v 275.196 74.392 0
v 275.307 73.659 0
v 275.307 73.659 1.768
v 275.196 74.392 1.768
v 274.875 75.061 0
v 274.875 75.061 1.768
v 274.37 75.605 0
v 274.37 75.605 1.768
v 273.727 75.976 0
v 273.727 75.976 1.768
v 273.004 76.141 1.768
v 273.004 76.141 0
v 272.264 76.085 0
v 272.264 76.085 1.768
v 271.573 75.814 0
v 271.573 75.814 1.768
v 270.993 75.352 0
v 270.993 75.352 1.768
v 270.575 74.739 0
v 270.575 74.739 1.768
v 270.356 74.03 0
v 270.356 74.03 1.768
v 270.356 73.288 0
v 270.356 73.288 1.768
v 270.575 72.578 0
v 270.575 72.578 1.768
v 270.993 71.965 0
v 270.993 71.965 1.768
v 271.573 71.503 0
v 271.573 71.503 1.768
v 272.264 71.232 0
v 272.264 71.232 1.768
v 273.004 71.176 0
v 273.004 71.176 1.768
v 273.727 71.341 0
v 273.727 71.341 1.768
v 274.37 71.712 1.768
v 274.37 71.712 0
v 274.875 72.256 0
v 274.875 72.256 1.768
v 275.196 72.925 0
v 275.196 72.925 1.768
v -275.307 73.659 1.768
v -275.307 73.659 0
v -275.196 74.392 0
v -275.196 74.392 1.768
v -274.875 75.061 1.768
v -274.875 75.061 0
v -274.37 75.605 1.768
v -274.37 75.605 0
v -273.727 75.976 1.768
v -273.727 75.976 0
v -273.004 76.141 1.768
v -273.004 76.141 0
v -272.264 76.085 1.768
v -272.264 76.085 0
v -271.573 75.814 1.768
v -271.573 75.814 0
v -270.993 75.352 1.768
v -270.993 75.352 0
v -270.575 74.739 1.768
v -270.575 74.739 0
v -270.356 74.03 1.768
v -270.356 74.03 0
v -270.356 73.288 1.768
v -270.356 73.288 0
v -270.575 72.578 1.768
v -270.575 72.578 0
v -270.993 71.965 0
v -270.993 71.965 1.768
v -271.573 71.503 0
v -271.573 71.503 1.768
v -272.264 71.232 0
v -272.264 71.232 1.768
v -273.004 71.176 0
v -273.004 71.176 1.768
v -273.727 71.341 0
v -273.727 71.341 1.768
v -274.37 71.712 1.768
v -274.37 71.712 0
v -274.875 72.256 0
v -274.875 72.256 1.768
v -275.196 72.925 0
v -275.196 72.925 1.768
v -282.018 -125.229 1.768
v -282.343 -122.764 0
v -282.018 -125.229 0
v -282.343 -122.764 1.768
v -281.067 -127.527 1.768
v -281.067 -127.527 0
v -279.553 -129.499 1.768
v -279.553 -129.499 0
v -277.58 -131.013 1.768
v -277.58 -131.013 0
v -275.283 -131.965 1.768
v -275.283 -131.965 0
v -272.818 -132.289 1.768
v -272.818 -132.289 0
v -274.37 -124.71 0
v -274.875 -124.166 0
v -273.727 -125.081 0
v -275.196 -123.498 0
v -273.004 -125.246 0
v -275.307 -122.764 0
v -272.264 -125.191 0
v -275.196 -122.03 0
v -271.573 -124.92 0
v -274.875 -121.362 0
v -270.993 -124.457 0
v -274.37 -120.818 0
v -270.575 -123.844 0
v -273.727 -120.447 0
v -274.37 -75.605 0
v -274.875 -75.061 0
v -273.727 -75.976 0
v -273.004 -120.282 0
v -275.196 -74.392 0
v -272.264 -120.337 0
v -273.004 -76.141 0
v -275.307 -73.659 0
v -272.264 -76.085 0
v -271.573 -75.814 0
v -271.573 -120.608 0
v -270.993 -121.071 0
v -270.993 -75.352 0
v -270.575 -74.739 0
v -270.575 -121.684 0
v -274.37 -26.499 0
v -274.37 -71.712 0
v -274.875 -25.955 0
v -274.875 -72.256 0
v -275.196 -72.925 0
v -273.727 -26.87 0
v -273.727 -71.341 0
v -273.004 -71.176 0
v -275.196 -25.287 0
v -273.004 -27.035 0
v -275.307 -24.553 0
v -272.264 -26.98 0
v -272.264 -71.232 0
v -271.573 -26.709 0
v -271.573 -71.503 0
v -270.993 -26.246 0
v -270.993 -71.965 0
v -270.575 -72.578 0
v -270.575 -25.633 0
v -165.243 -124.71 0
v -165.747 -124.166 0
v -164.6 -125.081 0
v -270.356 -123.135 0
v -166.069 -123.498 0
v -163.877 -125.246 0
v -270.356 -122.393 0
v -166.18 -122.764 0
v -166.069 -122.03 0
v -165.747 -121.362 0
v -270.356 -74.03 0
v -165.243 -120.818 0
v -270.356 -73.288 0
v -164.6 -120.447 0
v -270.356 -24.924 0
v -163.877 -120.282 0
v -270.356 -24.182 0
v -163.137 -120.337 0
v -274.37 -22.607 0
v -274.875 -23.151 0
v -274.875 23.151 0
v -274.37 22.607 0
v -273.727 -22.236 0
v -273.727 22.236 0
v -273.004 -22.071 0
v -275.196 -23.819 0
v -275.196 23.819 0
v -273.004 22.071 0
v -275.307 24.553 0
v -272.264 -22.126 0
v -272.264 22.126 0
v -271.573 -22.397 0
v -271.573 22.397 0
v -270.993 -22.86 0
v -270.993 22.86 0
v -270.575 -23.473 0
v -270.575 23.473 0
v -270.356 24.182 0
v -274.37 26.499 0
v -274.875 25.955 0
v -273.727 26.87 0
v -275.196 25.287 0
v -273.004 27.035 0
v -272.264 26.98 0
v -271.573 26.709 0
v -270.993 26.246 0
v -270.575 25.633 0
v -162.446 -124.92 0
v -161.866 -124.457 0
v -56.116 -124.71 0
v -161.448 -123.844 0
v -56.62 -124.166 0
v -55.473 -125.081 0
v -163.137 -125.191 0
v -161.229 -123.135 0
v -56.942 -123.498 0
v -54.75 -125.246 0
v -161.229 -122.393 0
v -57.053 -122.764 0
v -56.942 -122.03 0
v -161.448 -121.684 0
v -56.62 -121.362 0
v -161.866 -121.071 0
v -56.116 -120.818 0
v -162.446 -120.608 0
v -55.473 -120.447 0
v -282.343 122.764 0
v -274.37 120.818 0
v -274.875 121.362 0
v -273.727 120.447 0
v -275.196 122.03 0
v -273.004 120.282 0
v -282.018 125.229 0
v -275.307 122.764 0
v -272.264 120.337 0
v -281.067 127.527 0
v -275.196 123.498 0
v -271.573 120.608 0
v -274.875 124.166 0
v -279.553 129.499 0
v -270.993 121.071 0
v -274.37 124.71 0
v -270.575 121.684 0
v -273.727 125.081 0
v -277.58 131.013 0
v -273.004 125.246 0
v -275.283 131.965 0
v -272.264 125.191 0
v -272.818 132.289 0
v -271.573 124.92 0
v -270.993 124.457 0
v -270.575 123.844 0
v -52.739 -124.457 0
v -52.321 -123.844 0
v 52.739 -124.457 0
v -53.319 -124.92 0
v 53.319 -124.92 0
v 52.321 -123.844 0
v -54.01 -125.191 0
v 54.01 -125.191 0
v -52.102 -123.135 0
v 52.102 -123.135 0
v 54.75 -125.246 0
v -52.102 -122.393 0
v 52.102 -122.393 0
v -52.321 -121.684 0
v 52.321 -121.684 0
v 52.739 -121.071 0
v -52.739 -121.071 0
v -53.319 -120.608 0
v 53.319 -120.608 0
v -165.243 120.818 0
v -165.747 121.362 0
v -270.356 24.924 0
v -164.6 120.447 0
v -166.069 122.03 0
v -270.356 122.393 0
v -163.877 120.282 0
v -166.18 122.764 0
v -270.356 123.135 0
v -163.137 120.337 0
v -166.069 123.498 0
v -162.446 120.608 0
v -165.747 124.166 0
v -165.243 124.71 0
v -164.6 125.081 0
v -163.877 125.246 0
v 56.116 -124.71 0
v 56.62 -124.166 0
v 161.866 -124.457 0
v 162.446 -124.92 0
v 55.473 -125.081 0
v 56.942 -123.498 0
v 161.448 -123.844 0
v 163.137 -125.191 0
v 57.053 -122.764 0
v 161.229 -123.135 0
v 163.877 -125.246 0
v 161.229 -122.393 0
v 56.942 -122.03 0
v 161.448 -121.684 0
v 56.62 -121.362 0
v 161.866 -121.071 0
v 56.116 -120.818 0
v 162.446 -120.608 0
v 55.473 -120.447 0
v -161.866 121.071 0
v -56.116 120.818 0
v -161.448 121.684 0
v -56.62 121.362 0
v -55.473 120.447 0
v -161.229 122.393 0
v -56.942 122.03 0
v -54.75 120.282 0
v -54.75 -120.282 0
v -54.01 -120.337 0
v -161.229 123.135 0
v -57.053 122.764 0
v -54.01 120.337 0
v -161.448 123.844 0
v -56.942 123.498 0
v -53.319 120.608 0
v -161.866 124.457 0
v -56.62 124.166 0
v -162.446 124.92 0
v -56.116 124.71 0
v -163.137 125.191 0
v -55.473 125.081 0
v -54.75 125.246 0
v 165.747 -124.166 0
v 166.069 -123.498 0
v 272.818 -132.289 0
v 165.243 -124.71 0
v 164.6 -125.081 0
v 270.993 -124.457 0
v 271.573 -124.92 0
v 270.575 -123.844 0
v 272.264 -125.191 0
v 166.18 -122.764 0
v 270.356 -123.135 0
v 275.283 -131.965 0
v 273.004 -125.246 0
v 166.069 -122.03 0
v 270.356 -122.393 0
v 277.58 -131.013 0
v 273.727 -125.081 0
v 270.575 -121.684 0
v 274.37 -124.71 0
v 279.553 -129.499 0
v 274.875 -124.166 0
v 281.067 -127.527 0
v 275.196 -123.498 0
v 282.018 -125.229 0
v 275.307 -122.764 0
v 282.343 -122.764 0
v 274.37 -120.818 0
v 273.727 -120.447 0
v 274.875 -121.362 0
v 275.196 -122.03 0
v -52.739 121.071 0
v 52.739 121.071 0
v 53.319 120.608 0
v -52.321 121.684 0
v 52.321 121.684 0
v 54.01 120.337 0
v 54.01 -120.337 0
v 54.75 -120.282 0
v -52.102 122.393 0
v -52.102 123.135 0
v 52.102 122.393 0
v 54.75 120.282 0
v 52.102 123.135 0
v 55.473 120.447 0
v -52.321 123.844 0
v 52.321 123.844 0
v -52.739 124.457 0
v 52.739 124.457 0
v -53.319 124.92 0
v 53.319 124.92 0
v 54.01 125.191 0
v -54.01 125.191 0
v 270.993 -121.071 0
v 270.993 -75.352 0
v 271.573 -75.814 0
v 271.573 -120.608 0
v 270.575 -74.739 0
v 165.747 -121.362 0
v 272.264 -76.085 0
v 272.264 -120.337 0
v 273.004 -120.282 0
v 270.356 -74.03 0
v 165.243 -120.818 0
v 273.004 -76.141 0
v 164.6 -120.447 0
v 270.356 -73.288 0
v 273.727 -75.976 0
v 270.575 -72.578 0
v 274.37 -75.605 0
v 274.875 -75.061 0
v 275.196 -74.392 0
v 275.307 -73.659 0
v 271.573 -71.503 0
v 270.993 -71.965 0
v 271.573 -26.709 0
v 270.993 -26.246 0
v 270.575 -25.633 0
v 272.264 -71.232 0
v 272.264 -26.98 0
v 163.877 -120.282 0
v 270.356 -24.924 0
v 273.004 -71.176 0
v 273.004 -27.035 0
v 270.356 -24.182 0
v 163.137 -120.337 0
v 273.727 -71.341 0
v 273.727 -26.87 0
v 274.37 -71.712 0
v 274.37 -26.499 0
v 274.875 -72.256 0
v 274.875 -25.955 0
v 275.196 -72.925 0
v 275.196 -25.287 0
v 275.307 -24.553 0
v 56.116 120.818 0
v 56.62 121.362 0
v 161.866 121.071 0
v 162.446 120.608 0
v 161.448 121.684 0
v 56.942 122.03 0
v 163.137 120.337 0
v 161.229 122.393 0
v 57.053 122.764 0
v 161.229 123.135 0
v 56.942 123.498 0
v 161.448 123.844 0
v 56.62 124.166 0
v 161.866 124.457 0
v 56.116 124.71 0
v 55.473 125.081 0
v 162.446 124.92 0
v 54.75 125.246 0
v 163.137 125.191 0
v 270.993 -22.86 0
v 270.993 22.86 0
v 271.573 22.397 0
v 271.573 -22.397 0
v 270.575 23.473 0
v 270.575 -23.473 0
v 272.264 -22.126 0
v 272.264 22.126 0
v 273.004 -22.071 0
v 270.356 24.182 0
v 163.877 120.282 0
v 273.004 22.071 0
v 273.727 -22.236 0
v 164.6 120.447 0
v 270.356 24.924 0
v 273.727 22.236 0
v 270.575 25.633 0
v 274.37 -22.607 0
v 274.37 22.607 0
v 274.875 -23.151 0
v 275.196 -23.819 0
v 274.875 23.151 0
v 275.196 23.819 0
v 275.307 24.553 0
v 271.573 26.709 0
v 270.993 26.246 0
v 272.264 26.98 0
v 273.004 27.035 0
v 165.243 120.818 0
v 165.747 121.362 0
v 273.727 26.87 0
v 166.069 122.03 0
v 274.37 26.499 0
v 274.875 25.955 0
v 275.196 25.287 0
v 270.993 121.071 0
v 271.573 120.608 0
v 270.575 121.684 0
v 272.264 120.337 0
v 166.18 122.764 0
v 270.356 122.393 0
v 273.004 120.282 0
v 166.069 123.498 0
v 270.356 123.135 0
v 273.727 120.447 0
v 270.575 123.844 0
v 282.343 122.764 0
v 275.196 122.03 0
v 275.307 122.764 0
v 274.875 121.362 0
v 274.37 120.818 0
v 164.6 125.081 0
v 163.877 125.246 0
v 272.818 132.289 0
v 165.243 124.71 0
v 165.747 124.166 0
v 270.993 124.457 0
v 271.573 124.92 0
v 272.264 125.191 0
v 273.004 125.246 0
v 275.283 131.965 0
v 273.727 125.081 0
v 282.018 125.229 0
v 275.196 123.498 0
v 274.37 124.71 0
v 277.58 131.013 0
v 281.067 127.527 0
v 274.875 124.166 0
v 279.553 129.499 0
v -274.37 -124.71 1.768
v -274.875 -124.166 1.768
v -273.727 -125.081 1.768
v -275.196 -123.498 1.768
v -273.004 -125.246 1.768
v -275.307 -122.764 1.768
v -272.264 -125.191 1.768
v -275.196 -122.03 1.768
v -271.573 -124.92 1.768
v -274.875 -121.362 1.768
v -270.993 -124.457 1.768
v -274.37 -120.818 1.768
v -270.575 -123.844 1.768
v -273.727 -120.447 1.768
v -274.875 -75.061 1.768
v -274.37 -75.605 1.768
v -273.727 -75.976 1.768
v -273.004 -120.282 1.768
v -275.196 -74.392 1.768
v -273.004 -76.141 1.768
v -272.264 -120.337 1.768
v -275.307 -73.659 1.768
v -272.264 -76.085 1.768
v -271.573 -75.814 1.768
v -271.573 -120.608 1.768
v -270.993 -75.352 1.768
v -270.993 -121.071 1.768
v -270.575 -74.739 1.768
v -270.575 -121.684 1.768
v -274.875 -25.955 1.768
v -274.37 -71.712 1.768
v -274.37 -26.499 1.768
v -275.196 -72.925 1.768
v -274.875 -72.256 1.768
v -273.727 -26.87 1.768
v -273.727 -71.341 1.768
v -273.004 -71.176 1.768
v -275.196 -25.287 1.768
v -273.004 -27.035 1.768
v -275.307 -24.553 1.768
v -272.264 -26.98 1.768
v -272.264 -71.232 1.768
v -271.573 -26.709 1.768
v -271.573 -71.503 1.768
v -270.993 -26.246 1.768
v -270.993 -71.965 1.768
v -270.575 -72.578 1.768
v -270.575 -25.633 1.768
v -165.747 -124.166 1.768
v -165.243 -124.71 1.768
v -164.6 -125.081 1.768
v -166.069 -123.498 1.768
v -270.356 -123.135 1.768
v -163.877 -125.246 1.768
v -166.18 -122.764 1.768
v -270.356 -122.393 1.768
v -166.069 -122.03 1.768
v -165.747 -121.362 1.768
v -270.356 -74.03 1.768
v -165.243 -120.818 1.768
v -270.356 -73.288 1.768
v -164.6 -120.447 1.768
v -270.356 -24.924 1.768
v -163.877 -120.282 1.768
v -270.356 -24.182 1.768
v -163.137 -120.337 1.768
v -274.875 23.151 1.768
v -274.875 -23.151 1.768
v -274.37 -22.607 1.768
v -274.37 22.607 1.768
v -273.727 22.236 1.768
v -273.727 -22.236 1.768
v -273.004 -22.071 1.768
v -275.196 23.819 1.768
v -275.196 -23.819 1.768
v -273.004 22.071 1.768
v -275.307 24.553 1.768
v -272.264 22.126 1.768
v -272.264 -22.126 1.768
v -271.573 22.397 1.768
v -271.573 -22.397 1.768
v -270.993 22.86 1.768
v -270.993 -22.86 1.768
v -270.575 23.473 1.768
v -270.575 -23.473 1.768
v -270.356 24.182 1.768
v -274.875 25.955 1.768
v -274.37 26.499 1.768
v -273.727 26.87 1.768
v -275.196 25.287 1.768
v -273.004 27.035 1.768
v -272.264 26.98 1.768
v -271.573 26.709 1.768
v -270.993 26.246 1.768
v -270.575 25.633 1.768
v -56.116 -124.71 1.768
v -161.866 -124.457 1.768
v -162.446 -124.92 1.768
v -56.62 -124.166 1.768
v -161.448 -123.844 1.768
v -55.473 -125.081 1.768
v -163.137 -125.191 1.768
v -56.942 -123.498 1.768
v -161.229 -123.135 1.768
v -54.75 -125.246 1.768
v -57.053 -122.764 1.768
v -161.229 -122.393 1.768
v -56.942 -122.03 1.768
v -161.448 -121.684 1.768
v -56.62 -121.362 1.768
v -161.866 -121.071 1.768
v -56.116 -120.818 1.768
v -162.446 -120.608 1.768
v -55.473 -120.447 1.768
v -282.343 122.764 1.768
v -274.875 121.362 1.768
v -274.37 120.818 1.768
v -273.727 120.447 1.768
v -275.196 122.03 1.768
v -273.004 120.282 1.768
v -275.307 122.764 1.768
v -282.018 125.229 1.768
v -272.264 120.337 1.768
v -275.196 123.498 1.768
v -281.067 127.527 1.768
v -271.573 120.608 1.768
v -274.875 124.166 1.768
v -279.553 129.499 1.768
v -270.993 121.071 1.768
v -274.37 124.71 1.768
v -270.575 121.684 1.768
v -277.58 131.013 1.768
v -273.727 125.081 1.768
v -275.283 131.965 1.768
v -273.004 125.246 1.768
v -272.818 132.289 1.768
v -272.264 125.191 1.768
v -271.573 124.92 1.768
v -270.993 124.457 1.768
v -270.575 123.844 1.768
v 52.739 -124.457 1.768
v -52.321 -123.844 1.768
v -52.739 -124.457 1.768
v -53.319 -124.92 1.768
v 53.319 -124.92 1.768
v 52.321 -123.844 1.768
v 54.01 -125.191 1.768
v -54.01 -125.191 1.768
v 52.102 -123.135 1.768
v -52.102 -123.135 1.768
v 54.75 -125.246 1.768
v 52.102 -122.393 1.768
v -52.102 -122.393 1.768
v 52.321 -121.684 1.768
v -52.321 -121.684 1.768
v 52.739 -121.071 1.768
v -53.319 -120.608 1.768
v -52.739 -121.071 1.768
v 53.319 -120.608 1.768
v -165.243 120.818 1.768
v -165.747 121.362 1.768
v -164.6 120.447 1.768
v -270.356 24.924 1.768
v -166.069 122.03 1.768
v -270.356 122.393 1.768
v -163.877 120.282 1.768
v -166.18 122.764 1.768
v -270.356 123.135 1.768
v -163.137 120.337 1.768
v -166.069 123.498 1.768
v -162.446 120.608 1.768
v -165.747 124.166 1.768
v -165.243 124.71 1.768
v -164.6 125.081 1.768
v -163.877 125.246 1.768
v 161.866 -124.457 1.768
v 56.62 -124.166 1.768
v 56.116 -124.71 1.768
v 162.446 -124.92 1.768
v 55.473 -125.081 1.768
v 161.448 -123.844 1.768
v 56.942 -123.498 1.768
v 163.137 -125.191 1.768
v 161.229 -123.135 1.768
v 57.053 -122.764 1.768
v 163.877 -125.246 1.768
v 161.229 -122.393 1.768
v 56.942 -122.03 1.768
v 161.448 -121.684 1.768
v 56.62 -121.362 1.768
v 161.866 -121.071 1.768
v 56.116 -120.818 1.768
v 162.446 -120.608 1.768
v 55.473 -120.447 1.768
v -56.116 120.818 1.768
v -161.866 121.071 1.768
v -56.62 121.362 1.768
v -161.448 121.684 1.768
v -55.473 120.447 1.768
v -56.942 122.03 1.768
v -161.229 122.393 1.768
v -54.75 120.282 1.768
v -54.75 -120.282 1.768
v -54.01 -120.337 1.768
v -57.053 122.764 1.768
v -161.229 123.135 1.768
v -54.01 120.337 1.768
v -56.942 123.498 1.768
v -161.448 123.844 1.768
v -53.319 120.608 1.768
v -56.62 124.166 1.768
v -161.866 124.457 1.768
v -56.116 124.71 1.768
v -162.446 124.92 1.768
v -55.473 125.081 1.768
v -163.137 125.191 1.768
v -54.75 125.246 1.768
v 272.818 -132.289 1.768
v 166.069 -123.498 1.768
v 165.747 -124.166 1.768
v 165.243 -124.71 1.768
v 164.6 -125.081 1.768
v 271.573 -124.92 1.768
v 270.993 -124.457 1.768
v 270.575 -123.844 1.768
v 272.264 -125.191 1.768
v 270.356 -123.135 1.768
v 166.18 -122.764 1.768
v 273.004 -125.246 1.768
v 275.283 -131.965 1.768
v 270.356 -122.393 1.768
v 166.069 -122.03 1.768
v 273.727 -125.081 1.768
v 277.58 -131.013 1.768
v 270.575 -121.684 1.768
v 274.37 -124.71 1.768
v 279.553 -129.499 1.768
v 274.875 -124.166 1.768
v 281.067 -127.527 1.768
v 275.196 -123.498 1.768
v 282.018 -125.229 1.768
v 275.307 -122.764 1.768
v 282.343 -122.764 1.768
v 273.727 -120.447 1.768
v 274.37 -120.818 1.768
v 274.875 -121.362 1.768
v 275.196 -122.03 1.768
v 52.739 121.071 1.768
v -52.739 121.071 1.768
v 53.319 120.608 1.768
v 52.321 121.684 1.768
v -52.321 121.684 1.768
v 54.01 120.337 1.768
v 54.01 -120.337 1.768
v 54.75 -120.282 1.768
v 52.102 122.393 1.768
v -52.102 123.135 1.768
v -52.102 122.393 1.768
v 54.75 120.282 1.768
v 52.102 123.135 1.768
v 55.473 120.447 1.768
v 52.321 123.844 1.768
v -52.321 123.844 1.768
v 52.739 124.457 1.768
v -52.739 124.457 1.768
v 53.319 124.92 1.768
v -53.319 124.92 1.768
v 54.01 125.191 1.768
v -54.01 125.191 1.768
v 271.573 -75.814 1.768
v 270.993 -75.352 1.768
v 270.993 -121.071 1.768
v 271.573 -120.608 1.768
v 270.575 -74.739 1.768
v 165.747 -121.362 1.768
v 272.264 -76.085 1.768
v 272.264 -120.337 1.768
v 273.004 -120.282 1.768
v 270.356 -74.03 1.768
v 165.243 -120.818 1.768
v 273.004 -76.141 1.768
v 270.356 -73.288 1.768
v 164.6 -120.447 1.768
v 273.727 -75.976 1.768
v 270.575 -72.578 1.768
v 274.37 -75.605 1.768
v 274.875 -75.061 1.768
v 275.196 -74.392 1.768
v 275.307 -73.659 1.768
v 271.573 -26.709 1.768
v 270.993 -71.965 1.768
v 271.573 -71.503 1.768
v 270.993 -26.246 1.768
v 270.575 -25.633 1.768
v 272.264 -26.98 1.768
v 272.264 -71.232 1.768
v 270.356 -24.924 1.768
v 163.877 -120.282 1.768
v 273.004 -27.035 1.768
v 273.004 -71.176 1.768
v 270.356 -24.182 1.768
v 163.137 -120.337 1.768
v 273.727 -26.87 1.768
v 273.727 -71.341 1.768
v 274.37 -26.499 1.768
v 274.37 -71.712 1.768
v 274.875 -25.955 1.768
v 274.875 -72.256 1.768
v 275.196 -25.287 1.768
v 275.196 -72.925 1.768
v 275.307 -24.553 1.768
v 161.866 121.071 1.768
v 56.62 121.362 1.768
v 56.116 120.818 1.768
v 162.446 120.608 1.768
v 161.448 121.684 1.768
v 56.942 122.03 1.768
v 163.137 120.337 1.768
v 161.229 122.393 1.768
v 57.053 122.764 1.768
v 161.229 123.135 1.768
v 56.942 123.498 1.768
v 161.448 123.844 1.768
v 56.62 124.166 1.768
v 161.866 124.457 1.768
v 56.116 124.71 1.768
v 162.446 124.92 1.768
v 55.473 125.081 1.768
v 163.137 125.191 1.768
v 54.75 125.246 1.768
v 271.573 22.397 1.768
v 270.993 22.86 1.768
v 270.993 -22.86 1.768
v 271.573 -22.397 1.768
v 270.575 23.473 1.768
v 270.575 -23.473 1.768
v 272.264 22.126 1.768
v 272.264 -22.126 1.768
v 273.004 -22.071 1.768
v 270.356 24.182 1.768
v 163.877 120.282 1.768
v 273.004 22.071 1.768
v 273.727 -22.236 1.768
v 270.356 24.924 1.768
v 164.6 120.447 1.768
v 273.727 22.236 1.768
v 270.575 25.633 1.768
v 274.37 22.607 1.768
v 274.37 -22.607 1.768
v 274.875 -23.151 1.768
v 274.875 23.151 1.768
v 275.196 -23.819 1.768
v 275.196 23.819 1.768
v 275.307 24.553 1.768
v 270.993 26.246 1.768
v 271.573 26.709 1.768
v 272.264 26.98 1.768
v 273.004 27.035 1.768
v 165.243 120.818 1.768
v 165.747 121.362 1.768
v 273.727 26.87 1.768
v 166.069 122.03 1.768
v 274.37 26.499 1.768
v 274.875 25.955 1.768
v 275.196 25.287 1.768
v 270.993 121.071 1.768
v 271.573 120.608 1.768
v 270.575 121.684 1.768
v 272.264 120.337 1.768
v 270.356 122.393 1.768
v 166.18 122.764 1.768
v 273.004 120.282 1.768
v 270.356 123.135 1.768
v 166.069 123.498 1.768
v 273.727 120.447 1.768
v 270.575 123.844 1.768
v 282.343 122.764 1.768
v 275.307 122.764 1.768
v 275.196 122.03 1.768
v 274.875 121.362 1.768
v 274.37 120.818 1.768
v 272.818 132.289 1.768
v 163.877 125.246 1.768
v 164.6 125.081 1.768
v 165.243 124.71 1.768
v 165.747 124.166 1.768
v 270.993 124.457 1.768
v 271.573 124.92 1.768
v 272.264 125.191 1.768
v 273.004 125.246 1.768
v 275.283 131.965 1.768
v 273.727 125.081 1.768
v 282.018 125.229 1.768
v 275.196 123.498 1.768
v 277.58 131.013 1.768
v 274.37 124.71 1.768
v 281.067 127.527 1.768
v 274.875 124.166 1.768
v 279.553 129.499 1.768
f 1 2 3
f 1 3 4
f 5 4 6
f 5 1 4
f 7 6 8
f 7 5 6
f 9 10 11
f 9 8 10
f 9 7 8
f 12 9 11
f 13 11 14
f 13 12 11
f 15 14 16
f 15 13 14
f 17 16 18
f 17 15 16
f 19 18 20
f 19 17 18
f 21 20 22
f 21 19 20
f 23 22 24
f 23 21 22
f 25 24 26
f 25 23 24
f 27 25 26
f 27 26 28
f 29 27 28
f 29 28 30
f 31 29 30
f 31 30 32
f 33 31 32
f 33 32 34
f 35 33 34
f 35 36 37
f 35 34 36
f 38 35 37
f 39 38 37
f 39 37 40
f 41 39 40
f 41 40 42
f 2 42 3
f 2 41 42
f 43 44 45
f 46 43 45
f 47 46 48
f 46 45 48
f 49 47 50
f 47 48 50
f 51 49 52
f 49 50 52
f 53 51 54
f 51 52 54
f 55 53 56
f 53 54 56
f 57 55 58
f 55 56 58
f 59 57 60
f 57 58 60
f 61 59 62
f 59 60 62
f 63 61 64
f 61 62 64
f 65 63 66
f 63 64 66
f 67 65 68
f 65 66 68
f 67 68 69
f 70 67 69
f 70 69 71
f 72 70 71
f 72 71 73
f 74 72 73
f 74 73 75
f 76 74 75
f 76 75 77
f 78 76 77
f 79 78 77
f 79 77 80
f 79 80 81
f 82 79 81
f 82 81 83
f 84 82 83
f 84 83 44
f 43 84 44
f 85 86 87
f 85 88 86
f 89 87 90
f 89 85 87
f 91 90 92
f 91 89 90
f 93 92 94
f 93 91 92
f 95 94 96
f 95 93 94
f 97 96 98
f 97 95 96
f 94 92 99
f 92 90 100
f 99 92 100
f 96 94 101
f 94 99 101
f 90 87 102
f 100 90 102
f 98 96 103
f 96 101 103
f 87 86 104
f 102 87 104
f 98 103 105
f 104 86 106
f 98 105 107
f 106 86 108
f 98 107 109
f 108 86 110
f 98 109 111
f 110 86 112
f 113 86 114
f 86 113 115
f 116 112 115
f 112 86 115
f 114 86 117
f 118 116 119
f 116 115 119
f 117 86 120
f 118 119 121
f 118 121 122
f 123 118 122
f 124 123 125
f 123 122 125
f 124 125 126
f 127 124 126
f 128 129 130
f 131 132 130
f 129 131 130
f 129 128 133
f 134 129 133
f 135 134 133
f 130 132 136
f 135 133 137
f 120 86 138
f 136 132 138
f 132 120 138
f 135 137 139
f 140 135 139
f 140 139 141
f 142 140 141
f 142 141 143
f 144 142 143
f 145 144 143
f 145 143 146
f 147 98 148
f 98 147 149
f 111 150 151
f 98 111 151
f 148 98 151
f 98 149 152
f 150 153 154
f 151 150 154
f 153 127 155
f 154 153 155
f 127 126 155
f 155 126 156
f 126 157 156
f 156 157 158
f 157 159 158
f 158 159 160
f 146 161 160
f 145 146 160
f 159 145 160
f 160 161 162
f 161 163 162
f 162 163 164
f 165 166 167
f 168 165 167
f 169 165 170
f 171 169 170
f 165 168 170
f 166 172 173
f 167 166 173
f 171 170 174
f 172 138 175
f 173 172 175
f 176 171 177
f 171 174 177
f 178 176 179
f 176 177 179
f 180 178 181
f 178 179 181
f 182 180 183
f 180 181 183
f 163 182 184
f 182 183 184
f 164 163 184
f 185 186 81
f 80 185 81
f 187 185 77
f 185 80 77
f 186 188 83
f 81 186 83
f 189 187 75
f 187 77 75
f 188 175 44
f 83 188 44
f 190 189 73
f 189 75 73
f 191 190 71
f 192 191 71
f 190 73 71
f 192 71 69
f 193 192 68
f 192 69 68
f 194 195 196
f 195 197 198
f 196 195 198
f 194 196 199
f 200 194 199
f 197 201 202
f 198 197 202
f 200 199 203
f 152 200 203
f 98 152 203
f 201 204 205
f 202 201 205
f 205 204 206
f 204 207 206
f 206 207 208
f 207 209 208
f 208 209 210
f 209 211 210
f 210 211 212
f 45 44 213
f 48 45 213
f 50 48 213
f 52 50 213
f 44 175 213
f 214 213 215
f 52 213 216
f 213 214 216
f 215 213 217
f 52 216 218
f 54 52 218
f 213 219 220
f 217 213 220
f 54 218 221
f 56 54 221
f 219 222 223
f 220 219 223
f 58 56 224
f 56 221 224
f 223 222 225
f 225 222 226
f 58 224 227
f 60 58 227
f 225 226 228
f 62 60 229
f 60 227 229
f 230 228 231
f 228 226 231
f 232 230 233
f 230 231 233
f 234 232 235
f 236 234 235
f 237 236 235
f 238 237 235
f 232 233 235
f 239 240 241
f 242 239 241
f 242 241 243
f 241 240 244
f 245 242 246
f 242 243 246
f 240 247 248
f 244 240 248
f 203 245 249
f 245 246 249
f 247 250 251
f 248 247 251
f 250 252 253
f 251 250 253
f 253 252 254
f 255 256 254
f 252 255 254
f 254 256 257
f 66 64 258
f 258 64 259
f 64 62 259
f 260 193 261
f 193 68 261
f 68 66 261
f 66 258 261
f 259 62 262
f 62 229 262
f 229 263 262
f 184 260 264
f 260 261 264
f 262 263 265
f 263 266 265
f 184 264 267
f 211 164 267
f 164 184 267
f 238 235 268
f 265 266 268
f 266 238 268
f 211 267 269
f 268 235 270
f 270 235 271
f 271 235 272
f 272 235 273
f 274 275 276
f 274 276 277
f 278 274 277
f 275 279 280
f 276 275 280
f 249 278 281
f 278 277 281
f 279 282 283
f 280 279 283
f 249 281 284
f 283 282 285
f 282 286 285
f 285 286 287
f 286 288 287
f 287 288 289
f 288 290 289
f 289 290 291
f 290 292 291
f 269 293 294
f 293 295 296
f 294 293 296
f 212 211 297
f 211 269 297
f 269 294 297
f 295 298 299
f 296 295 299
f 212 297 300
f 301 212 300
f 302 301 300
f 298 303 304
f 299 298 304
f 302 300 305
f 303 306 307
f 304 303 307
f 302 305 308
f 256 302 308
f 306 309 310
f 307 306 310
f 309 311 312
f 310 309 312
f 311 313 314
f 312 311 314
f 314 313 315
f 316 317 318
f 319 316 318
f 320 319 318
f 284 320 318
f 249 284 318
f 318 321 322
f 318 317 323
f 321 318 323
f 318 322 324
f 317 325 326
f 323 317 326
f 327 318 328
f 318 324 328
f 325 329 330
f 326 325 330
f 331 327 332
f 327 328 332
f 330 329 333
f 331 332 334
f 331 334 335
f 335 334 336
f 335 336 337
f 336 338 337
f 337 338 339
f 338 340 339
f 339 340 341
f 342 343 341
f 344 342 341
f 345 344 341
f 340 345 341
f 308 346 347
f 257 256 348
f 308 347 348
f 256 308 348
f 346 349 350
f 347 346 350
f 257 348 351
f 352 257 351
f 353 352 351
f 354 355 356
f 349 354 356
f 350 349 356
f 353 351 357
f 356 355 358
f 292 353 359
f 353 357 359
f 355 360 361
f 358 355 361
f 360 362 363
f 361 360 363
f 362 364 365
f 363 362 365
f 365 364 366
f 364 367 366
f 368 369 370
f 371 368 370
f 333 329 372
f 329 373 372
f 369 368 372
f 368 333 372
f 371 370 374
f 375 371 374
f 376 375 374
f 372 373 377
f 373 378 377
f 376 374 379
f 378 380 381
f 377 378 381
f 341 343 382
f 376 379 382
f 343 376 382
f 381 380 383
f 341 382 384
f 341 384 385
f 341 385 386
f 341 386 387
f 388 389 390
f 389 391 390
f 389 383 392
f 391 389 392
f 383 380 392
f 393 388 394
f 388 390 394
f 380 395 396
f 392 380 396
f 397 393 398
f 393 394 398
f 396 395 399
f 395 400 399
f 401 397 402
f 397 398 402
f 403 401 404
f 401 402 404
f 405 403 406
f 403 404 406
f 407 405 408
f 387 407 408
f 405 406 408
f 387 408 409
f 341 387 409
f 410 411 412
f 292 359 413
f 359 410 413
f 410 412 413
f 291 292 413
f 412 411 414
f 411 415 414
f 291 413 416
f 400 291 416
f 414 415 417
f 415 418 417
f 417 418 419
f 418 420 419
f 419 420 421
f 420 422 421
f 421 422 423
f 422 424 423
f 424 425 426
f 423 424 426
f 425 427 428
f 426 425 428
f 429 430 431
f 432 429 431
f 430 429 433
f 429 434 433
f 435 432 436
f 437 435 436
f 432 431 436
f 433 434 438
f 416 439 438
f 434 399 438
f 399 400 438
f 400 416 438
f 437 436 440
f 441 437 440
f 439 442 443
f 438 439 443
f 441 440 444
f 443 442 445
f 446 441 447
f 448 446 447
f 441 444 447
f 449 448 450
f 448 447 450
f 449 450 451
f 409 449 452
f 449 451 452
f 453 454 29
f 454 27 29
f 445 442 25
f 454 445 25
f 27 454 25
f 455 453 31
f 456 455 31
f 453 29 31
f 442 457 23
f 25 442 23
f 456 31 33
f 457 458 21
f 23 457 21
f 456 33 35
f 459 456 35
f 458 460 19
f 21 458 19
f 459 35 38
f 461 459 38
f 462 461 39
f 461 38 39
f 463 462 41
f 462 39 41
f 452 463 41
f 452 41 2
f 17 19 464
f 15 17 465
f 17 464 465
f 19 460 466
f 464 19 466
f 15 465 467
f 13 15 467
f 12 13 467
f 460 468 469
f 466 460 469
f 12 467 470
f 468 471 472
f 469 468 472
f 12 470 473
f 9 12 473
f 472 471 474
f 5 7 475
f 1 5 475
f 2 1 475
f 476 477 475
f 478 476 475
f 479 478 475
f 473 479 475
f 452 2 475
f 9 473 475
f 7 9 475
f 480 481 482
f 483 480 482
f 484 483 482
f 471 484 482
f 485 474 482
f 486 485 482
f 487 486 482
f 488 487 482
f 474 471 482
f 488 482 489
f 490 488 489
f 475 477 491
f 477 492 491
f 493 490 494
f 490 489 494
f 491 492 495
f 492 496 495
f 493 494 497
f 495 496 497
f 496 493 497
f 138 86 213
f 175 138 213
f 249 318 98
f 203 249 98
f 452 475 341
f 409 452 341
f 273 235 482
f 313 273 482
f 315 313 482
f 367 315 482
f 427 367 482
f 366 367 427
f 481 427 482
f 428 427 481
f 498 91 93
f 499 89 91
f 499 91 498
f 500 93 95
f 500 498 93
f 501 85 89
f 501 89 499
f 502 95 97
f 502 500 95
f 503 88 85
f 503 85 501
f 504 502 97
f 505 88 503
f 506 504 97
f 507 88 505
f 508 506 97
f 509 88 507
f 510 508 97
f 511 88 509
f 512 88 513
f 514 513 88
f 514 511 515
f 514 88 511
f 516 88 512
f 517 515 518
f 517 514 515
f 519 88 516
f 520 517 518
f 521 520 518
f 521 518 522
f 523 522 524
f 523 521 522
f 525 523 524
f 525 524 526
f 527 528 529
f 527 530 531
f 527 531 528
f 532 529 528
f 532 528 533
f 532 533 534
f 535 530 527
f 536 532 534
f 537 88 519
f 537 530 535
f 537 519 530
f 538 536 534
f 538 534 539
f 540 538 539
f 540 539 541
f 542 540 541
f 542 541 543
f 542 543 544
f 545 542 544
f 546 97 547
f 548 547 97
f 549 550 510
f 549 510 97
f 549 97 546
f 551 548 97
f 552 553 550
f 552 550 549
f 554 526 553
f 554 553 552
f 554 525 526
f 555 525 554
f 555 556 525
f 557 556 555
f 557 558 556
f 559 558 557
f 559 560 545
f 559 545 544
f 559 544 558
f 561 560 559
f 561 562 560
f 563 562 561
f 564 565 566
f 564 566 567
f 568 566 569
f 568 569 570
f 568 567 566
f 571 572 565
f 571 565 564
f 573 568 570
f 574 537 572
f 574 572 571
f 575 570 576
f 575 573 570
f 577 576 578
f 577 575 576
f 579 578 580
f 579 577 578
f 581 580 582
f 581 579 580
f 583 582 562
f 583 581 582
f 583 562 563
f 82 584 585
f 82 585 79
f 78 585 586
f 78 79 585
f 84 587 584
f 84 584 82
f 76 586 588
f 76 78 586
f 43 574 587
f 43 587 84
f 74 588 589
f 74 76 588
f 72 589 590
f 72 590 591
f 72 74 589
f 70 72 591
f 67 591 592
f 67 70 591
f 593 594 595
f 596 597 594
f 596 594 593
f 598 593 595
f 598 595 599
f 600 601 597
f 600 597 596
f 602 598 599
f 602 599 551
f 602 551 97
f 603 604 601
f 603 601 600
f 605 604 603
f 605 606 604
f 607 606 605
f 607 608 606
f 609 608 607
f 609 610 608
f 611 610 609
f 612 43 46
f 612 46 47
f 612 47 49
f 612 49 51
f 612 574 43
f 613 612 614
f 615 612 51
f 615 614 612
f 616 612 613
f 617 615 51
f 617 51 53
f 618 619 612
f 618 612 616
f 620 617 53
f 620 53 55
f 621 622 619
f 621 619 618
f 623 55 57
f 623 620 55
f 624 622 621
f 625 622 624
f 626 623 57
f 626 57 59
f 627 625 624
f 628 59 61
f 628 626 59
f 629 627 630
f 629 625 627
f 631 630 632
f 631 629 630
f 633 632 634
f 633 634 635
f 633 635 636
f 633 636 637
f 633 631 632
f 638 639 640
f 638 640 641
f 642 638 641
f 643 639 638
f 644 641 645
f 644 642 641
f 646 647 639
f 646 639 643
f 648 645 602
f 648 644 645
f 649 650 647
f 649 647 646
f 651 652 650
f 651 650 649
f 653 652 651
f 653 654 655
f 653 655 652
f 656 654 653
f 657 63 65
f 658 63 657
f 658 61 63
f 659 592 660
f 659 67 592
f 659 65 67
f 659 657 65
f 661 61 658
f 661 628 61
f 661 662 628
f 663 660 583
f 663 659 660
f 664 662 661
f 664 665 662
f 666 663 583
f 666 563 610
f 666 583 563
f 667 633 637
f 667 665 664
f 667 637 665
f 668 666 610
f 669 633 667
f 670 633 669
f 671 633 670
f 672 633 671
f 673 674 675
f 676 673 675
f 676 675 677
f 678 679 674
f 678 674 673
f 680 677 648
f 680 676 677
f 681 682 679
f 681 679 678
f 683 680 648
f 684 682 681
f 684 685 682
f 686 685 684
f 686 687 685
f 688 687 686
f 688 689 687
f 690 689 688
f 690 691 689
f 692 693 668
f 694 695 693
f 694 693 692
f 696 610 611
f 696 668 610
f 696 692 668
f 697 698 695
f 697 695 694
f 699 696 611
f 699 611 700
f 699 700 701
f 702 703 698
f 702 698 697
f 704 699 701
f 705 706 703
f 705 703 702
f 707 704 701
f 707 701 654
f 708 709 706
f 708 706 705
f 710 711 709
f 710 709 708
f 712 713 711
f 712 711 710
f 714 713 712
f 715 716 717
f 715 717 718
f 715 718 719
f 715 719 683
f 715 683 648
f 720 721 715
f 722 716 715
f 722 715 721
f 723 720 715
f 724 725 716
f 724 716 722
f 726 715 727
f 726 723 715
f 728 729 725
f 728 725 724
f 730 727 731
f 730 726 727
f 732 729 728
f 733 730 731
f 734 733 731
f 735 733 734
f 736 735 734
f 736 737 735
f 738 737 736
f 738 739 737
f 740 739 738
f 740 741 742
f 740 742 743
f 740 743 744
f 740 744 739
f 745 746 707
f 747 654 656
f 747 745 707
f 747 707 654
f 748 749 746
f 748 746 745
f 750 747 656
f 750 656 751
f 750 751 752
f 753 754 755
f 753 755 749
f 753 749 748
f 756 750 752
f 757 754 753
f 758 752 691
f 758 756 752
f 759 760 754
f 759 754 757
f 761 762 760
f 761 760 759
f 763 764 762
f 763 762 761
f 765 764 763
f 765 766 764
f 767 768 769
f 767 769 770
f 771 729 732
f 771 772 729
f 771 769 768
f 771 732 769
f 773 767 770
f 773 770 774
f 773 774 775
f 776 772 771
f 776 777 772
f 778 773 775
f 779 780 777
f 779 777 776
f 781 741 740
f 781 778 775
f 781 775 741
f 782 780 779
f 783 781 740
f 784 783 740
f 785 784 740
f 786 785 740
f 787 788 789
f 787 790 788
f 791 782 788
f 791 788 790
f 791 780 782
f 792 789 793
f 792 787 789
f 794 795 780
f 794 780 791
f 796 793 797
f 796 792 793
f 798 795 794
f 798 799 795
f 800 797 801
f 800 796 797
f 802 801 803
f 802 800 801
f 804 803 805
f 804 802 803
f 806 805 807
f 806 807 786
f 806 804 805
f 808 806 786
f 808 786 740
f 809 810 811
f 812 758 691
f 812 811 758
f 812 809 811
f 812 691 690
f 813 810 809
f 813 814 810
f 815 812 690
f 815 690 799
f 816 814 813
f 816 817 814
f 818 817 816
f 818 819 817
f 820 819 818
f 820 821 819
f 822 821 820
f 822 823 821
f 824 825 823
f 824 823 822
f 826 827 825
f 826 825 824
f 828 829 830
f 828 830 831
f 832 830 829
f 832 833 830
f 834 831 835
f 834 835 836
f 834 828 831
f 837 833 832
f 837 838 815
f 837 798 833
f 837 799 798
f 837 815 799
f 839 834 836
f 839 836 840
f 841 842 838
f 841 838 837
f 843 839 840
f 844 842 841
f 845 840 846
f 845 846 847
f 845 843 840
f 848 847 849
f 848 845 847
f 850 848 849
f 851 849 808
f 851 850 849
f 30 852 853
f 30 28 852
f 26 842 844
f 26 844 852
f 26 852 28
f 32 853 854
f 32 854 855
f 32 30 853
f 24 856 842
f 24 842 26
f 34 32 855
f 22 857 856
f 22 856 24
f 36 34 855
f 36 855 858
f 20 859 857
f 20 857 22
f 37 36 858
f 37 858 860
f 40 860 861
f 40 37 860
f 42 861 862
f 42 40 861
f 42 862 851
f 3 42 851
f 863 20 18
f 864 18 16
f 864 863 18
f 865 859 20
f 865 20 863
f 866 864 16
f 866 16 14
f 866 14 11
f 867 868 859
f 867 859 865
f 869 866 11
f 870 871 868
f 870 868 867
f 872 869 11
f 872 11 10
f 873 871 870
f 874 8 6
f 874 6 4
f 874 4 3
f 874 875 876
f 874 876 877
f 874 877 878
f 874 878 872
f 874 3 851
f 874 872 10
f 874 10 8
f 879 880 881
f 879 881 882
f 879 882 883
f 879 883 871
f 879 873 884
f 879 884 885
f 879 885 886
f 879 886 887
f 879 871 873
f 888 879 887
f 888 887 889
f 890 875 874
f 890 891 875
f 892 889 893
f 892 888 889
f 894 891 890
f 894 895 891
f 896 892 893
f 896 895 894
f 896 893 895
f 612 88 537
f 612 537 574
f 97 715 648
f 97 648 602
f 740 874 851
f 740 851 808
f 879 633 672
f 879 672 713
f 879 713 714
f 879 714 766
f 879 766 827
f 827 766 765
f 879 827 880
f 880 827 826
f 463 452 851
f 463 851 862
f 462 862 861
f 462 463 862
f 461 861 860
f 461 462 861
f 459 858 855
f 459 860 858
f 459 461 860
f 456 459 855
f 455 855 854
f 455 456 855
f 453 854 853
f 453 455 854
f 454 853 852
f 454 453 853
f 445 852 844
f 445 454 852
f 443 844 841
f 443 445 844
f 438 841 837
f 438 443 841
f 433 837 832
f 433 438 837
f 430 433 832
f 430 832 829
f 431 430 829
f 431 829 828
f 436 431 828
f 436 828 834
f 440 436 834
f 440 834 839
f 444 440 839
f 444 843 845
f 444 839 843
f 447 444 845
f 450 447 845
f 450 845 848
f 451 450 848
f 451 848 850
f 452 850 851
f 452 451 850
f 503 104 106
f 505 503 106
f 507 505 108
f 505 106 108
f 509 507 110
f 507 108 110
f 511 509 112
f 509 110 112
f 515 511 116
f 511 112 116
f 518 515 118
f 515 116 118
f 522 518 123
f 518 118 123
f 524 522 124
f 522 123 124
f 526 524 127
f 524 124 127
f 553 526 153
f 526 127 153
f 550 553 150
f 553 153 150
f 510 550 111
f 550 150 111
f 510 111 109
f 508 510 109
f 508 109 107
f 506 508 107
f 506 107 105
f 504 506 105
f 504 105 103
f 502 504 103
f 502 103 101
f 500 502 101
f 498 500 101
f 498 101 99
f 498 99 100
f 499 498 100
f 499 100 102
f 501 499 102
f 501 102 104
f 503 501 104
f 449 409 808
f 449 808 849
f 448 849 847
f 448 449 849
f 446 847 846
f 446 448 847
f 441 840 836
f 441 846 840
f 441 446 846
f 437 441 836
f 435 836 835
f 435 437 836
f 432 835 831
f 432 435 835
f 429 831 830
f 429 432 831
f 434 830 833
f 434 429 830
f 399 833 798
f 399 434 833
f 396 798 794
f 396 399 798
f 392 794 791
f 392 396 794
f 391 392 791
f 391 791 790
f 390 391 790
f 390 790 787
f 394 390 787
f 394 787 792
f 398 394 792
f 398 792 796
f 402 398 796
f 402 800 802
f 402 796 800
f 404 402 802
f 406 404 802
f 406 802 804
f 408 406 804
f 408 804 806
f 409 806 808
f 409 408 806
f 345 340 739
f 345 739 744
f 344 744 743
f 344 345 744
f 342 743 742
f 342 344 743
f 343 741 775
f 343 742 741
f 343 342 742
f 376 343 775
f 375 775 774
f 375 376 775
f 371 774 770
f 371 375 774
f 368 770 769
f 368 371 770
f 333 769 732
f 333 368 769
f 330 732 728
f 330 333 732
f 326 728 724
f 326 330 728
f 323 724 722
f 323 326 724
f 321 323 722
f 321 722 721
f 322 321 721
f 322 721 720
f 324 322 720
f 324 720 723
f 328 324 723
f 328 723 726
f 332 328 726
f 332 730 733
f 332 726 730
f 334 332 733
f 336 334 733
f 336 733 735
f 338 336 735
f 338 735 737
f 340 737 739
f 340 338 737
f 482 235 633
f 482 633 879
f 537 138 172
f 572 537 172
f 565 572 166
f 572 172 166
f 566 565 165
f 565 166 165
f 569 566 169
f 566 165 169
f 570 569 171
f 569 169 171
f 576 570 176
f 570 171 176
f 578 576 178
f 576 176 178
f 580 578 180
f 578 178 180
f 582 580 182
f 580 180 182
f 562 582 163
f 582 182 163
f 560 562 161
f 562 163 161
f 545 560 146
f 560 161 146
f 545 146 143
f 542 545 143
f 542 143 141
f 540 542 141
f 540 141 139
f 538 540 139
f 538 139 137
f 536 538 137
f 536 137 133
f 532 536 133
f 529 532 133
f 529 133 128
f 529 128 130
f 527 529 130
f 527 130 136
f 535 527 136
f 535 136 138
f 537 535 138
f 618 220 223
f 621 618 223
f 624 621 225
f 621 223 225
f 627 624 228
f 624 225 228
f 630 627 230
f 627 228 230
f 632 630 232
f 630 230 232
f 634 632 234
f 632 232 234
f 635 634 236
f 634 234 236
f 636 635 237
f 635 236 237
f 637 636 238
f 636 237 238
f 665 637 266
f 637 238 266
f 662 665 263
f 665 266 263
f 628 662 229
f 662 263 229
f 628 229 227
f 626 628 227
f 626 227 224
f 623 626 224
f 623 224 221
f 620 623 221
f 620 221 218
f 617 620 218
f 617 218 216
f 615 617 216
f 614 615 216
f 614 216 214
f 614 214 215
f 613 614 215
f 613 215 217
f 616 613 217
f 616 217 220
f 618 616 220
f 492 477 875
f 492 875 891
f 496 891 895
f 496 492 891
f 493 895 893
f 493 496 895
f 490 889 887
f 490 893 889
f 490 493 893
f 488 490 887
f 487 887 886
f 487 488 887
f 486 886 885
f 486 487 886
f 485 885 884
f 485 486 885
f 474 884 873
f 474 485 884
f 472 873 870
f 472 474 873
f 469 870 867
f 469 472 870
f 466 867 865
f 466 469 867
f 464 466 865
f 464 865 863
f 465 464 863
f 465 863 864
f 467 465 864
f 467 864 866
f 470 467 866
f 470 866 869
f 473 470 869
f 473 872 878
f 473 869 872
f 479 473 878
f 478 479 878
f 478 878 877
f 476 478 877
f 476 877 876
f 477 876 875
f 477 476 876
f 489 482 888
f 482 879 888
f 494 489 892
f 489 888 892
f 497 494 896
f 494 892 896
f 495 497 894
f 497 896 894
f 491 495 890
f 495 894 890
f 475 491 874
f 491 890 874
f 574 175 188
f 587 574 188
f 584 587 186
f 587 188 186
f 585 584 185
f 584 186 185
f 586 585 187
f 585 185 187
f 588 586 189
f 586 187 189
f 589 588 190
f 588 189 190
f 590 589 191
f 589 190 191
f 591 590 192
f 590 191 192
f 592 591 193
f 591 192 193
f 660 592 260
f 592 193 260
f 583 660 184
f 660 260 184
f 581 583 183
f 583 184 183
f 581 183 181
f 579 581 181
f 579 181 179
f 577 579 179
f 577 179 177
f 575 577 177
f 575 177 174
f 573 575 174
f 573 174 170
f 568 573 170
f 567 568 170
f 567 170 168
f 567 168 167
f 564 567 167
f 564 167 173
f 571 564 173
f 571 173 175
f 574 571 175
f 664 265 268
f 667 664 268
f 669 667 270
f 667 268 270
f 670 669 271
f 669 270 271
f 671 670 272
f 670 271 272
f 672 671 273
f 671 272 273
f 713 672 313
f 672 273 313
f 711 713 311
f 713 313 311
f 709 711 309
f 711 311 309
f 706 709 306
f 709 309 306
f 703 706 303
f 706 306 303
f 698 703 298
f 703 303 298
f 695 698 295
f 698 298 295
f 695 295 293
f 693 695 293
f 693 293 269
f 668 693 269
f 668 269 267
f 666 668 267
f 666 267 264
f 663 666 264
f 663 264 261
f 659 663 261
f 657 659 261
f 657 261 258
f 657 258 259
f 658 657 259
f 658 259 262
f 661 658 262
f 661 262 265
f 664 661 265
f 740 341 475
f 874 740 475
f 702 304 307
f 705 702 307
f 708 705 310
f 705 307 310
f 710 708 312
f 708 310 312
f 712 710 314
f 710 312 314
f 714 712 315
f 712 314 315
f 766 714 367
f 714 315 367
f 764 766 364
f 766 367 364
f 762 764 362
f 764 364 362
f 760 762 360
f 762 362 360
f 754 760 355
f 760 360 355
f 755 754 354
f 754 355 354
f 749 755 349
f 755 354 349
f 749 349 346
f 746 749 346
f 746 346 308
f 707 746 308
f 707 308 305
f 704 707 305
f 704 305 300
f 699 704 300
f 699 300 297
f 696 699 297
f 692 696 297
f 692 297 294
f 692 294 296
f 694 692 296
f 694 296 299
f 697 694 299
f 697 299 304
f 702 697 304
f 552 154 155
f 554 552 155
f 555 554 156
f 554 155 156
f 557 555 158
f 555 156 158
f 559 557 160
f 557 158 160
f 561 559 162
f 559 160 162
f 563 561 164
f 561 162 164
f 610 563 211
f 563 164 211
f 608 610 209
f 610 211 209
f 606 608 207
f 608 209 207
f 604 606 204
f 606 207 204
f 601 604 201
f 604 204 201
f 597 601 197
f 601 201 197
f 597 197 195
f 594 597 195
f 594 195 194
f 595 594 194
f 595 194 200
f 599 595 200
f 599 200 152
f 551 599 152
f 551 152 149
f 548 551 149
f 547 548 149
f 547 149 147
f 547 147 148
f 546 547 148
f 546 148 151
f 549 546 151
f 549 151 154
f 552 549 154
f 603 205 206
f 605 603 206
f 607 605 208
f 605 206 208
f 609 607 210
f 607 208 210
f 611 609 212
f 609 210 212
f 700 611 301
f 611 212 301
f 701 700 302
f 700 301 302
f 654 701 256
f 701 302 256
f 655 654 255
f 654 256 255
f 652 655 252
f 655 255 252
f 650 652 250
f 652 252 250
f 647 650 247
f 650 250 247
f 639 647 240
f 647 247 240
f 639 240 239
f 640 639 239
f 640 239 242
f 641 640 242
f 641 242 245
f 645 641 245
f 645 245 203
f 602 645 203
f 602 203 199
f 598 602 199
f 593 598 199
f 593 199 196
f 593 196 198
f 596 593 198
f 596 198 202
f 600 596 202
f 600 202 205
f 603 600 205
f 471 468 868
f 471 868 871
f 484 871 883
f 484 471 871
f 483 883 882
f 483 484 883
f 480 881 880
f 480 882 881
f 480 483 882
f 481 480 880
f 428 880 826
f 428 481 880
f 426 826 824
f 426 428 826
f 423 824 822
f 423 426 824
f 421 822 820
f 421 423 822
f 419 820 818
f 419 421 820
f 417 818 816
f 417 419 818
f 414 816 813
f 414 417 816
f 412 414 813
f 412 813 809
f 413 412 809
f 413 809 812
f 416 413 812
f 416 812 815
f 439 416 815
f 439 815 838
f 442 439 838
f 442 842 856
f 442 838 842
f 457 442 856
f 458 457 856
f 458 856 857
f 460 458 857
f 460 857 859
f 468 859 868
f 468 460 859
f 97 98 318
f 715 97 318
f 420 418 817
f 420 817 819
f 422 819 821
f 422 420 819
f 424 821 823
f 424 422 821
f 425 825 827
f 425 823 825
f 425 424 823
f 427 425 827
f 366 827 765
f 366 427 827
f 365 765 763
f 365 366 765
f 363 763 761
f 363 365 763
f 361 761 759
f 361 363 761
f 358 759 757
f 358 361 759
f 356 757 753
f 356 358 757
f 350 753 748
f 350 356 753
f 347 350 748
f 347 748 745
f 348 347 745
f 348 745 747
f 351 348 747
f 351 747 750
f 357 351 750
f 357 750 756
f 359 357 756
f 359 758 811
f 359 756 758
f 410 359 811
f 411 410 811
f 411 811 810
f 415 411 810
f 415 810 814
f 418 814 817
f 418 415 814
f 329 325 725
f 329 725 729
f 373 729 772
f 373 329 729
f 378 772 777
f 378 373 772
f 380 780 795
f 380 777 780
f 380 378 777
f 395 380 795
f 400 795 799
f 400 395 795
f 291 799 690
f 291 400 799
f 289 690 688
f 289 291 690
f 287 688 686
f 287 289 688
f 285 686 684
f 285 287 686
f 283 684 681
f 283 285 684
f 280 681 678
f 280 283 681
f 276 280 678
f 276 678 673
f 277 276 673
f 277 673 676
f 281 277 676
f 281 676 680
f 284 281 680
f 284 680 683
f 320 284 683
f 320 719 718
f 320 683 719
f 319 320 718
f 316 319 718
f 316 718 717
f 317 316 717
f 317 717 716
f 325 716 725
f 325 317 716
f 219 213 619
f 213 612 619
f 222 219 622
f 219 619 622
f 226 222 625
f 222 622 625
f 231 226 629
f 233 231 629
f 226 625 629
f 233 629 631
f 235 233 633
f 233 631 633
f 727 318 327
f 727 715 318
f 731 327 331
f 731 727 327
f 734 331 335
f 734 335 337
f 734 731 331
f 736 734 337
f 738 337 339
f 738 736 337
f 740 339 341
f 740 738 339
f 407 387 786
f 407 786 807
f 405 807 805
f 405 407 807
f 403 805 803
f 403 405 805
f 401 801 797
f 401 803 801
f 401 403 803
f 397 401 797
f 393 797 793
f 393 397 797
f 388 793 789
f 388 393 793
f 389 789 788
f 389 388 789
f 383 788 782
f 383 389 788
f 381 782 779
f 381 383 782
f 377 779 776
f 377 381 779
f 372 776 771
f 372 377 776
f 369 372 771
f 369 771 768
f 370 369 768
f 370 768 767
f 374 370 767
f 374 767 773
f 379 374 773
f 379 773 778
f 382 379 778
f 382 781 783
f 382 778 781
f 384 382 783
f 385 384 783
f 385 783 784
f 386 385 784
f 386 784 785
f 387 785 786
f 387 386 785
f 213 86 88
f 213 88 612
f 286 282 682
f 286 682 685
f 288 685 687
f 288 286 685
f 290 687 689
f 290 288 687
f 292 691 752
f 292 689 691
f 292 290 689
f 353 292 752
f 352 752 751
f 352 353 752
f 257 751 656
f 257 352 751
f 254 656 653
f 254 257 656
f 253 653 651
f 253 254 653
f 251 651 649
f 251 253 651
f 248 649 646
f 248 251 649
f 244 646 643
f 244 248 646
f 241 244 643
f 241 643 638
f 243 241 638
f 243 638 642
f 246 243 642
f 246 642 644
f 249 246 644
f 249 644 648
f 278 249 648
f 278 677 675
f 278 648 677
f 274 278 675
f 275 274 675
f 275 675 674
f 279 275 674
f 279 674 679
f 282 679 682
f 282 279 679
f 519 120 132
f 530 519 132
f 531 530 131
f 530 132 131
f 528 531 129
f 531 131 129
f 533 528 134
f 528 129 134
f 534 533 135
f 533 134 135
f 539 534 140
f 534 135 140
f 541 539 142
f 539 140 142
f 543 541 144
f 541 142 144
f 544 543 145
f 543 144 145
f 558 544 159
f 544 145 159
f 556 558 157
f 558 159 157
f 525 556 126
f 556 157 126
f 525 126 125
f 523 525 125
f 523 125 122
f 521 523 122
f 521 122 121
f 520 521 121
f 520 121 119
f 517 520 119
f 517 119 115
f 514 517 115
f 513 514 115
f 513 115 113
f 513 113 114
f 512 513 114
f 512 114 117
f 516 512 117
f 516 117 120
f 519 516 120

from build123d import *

# Parameters (mm, degrees)
SKETCH1_W              = 564.685680888
SKETCH1_H              = 264.578396166
BOSS_EXTRUDE1_DEPTH    = 1.76784
F_10_CLEARANCE_HOLE1_D = 4.9784
FILLET1_R              = 9.525


with BuildPart() as part:
    # Sketch1 → Boss-Extrude1 (new body)
    with BuildSketch(Plane.XY):
        Rectangle(SKETCH1_W, SKETCH1_H)
    extrude(amount=BOSS_EXTRUDE1_DEPTH)

    # #10 Clearance Hole1 (through all)
    with Locations(Plane.XY.offset(1.76784)):
        with Locations((-272.817840444, -122.764198083), (-272.817840444, -73.65851885), (-272.817840444, -24.552839617), (-272.817840444, 24.552839617), (-272.817840444, 73.65851885), (-272.817840444, 122.764198083), (-163.690704266, 122.764198083), (-54.563568089, 122.764198083), (-54.563568089, -122.764198083), (-163.690704266, -122.764198083)):
            f_10_clearance_hole1 = Hole(F_10_CLEARANCE_HOLE1_D / 2)

    # Mirror1: #10 Clearance Hole1 across plane
    add(f_10_clearance_hole1.mirror(Plane(origin=(0, 0, 0), x_dir=(0, 0, 1), z_dir=(1, 0, 0))), mode=Mode.SUBTRACT)

    # Fillet1
    fillet1_edges = [part.edges().sort_by_distance(p)[0] for p in [
        (282.342840444, -132.289198083, 0.88392),
        (-282.342840444, -132.289198083, 0.88392),
        (-282.342840444, 132.289198083, 0.88392),
        (282.342840444, 132.289198083, 0.88392),
    ]]
    fillet(fillet1_edges, radius=FILLET1_R)


solid = part.part
